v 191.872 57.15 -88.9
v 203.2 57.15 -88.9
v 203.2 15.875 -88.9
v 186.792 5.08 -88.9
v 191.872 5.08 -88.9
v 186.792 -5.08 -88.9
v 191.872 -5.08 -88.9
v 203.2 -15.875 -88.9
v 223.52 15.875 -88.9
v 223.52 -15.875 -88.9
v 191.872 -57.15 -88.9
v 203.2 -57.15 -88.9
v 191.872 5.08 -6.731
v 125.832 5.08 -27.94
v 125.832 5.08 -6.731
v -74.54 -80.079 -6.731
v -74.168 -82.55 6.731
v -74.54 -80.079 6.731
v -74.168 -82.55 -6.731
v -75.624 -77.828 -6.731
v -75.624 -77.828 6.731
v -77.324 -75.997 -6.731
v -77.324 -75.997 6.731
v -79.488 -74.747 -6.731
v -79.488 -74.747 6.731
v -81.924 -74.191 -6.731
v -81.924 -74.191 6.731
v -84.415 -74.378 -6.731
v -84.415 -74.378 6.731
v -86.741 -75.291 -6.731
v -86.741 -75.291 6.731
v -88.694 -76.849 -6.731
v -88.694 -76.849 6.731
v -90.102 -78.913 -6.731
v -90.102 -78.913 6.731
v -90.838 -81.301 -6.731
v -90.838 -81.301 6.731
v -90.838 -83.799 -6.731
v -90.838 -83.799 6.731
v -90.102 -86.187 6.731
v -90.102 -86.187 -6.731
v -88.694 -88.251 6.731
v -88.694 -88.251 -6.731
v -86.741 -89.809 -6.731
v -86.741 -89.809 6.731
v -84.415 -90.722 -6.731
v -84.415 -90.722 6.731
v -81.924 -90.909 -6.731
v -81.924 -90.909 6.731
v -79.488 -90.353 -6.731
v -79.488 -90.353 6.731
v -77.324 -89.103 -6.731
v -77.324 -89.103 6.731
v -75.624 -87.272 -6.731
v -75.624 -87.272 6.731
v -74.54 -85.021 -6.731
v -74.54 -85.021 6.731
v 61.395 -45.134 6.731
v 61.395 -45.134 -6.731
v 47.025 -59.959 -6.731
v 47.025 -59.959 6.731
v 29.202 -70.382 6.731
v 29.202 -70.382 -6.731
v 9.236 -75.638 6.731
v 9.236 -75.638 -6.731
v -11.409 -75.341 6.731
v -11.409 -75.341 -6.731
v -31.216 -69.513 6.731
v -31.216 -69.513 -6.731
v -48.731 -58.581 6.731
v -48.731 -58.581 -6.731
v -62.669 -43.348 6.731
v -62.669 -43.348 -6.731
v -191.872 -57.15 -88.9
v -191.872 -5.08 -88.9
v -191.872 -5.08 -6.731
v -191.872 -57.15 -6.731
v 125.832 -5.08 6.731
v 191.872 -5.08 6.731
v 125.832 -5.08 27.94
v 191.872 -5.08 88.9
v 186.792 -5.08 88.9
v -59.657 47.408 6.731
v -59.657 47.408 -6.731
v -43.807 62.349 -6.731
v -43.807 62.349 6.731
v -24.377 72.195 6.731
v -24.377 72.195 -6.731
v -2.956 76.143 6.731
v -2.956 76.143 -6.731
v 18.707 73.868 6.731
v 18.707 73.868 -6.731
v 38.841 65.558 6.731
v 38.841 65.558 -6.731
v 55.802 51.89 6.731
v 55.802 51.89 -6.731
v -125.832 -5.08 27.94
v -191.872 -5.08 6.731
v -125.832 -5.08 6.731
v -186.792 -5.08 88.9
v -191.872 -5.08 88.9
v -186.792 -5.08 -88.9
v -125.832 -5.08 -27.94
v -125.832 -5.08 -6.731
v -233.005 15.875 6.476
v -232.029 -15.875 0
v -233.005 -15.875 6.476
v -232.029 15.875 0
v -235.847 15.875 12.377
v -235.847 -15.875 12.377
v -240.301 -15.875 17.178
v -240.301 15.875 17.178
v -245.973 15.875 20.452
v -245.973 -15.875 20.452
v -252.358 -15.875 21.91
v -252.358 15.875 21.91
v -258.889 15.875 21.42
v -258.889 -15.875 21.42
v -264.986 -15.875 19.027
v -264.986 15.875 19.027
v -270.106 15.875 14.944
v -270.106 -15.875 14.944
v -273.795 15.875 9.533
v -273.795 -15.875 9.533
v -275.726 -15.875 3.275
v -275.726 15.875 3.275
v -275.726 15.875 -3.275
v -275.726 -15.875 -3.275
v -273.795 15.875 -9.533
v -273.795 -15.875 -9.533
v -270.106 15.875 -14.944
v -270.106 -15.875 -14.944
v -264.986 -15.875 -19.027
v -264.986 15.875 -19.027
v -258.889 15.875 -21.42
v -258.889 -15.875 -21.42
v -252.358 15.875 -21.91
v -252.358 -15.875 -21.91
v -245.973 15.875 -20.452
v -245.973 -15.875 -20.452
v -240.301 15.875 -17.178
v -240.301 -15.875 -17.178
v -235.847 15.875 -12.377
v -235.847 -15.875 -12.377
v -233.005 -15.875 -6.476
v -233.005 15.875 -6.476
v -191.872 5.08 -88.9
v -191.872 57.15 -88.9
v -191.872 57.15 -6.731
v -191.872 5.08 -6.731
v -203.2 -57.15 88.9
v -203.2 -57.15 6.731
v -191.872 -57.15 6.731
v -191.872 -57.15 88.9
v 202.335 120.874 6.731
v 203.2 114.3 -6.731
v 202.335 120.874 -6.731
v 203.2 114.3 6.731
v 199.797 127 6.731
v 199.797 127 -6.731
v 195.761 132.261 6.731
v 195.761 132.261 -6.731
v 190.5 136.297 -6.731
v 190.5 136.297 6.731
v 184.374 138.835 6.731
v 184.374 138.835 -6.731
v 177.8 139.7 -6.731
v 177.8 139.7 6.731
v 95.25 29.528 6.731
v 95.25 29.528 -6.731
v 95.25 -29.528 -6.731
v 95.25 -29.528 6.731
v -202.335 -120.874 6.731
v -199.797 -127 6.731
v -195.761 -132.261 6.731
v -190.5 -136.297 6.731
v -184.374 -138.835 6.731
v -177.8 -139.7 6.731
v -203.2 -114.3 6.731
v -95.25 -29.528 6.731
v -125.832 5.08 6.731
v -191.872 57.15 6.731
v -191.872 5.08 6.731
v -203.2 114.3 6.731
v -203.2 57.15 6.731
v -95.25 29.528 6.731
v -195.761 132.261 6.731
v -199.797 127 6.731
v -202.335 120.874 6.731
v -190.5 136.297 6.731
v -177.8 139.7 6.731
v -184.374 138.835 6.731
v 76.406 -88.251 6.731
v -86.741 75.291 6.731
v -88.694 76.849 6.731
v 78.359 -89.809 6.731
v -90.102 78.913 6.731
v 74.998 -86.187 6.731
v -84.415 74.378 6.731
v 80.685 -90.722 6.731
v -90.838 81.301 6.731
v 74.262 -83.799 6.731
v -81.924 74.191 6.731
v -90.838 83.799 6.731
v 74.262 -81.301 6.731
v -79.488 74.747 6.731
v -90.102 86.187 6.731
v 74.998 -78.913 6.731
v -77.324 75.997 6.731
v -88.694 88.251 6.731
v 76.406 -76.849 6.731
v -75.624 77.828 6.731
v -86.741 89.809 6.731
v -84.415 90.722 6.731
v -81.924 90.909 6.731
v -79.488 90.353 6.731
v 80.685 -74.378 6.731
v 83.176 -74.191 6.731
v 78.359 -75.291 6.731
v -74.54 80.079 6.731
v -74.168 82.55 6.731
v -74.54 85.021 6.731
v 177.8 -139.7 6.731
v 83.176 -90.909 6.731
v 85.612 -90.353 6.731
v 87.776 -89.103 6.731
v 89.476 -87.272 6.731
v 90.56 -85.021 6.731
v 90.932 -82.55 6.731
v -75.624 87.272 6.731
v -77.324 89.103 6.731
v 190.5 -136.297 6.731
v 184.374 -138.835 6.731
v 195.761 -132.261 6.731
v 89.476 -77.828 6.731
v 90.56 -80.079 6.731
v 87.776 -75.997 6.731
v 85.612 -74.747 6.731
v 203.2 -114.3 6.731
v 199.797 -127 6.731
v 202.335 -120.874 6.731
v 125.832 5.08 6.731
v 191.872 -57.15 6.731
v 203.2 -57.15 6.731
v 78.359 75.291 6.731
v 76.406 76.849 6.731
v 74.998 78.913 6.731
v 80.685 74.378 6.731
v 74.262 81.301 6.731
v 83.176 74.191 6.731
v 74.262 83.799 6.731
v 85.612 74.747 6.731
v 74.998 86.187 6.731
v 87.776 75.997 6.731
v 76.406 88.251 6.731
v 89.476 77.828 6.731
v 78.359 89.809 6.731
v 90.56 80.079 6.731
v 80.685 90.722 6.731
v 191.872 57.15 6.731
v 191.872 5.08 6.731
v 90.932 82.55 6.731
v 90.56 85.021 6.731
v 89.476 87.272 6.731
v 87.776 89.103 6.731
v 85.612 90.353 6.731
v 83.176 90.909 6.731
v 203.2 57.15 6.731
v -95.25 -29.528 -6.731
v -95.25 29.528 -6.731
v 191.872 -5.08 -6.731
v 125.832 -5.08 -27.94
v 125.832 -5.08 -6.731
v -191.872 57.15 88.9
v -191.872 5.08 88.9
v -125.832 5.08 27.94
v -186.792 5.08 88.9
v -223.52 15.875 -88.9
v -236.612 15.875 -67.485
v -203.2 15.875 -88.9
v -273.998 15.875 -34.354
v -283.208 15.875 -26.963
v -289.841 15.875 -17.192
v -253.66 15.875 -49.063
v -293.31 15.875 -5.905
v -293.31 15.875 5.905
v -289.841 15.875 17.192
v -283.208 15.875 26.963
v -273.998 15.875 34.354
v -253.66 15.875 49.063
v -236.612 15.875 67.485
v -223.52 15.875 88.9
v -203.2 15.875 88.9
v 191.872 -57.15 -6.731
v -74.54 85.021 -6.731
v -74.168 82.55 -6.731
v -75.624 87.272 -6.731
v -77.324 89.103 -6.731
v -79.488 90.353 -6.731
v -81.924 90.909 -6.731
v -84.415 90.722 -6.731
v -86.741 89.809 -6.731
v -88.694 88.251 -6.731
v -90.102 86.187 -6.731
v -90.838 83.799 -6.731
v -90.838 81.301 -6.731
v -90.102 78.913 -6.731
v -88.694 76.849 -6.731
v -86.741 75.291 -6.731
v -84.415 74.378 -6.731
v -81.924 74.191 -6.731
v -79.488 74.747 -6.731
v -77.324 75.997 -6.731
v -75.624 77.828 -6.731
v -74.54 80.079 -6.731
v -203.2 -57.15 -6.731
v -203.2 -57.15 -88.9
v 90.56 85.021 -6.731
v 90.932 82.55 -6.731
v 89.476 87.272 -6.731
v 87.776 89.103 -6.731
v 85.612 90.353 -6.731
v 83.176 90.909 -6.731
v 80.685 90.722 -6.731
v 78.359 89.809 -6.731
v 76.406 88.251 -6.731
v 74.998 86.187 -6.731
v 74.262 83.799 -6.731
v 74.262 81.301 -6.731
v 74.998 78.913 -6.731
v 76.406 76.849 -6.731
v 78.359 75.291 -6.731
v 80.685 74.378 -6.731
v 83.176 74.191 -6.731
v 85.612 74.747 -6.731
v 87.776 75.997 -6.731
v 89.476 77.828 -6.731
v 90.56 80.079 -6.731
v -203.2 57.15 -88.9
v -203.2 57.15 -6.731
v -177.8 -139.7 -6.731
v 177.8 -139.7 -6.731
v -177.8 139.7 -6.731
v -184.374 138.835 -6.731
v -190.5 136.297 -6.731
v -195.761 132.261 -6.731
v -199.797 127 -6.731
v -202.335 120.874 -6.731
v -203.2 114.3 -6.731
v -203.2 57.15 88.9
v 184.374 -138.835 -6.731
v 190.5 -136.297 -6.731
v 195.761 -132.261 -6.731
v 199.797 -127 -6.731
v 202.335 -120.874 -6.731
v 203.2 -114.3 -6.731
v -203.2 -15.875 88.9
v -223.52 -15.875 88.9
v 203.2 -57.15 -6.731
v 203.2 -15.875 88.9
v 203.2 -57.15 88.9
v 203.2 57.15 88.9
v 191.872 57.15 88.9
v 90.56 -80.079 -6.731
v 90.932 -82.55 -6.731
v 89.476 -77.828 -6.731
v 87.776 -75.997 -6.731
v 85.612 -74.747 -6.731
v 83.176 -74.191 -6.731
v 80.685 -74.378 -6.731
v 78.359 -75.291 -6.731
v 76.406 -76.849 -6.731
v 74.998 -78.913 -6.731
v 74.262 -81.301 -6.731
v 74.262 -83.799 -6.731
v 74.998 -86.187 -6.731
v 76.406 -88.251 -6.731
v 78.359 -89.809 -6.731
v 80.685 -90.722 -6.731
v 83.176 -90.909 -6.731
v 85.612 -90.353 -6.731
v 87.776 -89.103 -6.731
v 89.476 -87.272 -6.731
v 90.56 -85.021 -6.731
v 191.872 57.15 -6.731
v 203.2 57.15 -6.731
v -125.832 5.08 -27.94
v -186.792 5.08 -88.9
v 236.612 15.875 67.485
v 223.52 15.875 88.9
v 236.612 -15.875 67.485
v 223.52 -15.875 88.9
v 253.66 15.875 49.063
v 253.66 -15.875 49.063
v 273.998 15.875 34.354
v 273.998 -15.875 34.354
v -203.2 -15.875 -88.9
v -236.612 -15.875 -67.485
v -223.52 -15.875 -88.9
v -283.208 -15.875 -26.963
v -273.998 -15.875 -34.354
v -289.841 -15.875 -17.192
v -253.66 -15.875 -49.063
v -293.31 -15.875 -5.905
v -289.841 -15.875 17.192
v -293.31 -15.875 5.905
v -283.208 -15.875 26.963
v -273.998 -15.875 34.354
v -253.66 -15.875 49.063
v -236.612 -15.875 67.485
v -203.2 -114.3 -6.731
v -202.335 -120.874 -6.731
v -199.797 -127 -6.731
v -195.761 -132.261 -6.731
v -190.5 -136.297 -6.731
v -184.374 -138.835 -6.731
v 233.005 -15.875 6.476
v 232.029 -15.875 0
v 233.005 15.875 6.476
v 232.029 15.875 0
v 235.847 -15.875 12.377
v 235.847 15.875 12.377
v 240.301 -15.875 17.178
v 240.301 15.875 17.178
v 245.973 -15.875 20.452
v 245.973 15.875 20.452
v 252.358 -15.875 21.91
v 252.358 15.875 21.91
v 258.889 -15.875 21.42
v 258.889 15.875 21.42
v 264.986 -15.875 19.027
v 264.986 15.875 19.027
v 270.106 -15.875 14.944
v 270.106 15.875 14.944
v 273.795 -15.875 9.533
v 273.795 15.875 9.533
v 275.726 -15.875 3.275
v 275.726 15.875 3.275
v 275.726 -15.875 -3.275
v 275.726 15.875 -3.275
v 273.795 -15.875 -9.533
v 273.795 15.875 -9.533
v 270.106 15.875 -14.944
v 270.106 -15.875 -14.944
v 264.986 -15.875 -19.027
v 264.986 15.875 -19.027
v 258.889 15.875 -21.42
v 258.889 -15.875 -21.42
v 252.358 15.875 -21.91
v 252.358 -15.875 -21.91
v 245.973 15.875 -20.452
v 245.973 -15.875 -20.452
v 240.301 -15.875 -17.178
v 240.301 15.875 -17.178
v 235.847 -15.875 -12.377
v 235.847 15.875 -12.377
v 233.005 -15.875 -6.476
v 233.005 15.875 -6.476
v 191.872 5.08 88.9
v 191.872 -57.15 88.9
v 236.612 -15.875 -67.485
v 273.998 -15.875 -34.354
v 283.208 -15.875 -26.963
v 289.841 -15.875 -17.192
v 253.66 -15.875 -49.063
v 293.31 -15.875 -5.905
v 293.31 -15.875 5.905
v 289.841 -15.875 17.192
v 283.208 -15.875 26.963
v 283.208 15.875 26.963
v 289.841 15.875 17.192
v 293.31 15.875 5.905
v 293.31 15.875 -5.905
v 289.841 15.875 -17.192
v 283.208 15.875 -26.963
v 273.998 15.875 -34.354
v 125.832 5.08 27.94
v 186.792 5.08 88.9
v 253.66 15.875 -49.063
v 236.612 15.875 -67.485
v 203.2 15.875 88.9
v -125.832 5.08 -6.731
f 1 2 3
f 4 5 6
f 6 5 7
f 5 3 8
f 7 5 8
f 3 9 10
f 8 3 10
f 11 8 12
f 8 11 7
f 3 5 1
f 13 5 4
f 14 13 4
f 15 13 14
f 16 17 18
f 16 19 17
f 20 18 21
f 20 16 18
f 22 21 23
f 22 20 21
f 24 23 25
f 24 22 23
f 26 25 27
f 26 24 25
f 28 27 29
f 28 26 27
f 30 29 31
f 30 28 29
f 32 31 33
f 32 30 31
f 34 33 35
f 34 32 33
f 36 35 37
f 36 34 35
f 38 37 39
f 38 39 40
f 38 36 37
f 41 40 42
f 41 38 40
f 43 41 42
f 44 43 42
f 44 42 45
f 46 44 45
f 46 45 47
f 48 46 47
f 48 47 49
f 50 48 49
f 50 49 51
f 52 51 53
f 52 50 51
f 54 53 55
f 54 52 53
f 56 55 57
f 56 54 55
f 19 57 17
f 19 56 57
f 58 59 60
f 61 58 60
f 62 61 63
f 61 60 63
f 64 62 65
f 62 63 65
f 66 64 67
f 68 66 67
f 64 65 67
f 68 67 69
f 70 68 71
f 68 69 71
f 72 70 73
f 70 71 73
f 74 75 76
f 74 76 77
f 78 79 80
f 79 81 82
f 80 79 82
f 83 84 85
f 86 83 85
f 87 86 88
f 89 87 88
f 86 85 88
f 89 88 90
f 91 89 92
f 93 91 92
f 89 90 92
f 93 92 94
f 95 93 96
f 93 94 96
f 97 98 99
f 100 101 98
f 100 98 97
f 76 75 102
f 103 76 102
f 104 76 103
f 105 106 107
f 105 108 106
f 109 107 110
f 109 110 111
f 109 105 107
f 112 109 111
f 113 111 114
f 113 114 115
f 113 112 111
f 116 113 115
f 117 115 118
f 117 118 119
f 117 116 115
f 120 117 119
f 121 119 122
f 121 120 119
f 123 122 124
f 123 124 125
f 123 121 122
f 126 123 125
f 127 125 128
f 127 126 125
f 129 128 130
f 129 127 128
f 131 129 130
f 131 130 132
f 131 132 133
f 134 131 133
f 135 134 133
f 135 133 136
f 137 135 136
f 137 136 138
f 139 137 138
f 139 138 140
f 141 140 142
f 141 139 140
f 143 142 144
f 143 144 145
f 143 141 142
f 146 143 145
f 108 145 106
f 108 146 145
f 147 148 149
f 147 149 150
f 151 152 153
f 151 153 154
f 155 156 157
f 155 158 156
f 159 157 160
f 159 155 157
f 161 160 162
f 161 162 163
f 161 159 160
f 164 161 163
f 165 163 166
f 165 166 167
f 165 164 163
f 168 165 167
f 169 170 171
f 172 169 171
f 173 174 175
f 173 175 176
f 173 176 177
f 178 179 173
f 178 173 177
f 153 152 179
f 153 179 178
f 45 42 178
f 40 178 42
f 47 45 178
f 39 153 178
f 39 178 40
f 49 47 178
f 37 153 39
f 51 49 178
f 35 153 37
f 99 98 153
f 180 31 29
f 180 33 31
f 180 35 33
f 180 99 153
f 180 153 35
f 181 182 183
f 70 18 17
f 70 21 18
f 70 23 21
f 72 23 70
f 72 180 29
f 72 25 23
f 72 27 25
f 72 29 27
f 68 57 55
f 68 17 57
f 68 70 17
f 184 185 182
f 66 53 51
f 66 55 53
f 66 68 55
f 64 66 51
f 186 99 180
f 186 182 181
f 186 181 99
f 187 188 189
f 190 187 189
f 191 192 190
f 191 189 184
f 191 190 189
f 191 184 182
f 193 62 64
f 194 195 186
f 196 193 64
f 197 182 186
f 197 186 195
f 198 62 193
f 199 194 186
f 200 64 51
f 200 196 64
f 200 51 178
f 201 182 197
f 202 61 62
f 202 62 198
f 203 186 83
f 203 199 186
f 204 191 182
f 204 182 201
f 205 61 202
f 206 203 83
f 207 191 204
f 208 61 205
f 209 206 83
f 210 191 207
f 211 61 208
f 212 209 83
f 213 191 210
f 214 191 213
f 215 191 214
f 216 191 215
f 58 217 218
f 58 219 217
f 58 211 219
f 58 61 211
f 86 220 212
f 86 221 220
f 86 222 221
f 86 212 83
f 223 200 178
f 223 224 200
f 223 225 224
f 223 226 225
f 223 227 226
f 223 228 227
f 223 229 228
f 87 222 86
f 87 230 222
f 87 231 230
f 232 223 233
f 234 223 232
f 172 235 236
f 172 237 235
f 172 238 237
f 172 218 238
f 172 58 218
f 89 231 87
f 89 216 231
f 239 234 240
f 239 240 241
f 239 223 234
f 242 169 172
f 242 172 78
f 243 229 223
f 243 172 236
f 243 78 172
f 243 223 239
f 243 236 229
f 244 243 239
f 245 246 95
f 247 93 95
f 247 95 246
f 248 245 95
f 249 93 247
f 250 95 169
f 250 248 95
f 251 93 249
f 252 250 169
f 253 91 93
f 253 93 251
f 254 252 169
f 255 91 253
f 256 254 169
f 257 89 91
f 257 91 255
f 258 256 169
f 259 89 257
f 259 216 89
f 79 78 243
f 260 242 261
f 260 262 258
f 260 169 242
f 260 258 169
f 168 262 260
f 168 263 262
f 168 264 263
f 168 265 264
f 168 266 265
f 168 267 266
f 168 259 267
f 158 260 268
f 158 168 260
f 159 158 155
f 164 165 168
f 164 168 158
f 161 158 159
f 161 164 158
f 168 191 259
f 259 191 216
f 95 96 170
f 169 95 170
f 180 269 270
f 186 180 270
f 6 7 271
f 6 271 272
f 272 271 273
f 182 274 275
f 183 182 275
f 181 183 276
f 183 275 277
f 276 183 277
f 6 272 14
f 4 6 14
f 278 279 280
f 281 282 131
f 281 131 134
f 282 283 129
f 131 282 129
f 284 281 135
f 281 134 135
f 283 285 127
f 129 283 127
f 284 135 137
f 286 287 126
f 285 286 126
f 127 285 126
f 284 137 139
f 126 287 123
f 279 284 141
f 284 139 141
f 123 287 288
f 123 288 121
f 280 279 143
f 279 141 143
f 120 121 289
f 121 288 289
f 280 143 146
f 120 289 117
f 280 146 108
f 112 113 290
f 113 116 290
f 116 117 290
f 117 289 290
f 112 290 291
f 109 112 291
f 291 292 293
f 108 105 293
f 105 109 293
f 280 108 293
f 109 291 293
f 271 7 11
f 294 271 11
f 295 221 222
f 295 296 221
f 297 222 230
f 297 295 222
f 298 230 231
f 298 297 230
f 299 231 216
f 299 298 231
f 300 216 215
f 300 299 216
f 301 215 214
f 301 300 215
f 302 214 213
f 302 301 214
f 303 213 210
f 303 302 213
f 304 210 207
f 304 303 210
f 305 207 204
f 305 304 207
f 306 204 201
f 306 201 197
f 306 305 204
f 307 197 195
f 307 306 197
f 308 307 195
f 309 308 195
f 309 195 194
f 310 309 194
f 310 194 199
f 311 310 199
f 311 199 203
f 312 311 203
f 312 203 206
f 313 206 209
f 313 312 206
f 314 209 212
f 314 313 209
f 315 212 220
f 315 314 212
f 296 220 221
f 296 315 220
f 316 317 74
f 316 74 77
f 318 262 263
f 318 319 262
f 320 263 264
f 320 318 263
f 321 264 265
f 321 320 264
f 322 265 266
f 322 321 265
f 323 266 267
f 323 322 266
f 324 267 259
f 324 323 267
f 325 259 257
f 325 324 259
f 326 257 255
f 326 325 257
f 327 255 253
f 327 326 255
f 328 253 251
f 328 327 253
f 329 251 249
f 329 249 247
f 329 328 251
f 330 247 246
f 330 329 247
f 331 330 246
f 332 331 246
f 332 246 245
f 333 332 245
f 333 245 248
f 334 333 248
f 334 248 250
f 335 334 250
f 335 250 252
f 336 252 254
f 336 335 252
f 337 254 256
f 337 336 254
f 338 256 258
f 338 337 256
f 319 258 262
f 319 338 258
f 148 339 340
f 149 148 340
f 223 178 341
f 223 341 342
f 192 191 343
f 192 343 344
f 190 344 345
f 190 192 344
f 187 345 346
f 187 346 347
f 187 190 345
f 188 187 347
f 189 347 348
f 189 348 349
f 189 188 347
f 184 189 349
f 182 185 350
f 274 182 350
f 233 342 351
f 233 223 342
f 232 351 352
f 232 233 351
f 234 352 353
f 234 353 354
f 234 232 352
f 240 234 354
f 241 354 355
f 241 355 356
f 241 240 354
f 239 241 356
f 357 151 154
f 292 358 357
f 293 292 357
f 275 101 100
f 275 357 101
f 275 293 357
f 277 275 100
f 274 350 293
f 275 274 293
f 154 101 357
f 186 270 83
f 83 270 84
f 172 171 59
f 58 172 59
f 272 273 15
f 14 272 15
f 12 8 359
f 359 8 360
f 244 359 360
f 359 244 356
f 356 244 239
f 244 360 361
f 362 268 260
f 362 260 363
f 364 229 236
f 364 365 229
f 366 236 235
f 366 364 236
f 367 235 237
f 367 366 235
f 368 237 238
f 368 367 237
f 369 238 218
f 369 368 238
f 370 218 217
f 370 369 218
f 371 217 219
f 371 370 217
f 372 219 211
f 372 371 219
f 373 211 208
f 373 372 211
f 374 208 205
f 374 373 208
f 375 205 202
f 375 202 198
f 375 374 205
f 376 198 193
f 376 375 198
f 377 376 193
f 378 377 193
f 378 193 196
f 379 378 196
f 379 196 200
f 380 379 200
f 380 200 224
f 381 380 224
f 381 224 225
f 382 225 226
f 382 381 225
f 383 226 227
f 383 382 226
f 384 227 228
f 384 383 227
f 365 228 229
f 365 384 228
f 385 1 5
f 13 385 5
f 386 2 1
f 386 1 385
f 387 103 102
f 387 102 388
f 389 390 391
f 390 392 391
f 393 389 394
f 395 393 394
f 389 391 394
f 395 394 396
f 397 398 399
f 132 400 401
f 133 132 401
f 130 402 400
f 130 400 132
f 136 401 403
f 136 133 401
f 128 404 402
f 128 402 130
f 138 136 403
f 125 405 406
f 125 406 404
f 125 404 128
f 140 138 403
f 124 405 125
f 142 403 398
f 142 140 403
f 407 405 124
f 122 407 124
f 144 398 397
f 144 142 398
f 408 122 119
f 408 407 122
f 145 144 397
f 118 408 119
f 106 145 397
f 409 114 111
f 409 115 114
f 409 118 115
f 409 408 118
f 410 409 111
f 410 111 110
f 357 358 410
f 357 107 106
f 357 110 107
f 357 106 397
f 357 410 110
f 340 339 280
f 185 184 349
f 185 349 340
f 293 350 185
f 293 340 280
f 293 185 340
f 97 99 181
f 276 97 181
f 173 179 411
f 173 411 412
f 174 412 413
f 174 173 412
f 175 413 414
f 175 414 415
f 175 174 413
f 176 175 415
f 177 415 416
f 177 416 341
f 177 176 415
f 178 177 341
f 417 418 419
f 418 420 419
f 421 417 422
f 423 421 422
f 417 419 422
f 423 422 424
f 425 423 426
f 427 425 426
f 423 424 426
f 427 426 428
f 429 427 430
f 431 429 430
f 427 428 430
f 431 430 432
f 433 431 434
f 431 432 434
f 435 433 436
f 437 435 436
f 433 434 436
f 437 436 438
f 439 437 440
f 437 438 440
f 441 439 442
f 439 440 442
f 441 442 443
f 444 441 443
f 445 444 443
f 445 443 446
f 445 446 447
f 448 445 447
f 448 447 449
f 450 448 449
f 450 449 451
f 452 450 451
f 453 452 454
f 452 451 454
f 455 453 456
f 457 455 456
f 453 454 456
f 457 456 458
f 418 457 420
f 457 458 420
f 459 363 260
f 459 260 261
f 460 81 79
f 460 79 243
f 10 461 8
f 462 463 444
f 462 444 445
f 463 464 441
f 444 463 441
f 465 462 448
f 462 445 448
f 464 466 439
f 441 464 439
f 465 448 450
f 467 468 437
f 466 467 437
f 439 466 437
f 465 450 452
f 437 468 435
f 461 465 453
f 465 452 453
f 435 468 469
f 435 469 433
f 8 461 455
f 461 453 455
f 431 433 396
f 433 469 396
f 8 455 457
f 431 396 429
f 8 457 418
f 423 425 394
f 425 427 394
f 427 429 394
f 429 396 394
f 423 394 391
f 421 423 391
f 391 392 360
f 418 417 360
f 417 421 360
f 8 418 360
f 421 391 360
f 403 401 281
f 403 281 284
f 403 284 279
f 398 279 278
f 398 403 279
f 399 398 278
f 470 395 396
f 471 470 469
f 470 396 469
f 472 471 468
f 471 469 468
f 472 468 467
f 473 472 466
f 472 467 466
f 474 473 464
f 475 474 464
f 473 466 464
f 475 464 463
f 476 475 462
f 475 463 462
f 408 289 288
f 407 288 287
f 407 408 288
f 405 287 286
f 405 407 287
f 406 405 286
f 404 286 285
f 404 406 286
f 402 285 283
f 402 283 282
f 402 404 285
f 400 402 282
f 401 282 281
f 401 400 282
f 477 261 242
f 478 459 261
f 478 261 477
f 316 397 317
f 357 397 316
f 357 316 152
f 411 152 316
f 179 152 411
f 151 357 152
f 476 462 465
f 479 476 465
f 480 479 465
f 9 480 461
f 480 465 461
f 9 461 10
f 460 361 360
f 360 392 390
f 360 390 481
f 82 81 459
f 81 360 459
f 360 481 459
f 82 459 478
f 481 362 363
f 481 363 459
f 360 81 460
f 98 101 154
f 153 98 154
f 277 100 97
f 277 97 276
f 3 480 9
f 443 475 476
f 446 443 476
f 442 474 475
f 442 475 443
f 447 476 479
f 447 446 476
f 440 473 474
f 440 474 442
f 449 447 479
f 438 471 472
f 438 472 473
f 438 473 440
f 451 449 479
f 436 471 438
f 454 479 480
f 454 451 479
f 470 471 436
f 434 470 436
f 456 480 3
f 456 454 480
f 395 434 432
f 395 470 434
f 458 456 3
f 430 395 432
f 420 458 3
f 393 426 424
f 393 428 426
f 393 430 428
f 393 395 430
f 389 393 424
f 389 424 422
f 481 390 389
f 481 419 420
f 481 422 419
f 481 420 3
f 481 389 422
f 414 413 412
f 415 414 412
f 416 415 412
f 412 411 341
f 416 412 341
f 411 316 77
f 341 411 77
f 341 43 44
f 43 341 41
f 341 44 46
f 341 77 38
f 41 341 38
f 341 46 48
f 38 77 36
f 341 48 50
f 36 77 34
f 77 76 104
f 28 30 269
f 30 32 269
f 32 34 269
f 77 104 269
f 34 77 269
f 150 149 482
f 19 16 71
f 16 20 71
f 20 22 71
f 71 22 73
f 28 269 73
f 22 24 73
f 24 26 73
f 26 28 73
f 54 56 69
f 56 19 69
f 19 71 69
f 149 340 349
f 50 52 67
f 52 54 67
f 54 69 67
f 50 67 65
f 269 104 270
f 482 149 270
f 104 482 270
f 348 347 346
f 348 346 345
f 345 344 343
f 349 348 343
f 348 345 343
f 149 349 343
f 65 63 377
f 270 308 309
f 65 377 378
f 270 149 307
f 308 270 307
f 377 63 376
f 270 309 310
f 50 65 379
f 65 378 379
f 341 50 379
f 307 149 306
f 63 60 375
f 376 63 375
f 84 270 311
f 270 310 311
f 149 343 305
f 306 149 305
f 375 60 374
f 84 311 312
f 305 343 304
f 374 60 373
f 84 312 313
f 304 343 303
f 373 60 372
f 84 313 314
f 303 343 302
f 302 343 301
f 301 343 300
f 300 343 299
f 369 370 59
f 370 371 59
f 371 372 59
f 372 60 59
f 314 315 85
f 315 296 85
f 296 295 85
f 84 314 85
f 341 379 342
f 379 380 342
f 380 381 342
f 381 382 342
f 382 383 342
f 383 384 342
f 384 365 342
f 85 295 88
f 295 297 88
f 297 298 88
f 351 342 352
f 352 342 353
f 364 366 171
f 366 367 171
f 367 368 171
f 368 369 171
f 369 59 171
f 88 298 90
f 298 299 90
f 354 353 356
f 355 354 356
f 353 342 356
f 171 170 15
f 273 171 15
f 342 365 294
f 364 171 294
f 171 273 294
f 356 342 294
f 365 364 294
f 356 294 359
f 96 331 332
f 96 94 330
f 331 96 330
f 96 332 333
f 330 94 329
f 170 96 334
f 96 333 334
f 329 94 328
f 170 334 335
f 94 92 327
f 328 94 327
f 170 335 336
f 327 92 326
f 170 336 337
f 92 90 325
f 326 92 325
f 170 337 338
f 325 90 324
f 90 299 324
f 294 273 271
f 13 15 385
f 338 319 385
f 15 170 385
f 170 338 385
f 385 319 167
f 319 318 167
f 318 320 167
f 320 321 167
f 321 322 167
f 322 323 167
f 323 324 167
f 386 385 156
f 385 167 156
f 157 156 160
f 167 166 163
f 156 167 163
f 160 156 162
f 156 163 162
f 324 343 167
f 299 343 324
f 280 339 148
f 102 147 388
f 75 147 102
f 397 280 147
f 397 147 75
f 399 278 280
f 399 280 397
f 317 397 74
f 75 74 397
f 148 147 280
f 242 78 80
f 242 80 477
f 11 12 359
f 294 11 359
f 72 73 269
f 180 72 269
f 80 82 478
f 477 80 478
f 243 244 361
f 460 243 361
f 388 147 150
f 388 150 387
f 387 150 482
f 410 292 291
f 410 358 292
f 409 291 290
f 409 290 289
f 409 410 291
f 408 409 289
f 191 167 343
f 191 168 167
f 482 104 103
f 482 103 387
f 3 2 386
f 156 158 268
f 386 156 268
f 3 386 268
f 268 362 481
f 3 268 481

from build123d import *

# Parameters (mm, degrees)
F0_R      = 8.382
F1_DEPTH  = 6.731
F2_W      = 114.3
F2_H      = 177.8
F3_DEPTH  = 11.3284
F4_R      = 21.971
F5_DEPTH  = 15.875
F6_W      = 66.04
F6_H      = 10.16
F7_DEPTH  = 177.8
F8_SIZE   = 60.96
F10_DEPTH = 95.632


# Not quite as in the source:
# - a pattern or mirror of a feature is missing from the dataset's text; its kind, count and spacing are read off the source's solid


with BuildPart() as f1:
    # F0 (on Top) → F1 (new body, symmetric)
    with BuildSketch(Plane.XY):
        with BuildLine():
            Line((177.8, 139.7), (-177.8, 139.7))
            ThreePointArc((-177.8, 139.7), (-195.7605122421, 132.2605122421), (-203.2, 114.3))
            Line((-203.2, 114.3), (-203.2, -114.3))
            ThreePointArc((-203.2, -114.3), (-195.7605122421, -132.2605122421), (-177.8, -139.7))
            Line((-177.8, -139.7), (177.8, -139.7))
            ThreePointArc((177.8, -139.7), (195.7605122421, -132.2605122421), (203.2, -114.3))
            Line((203.2, -114.3), (203.2, 114.3))
            ThreePointArc((203.2, 114.3), (195.7605122421, 132.2605122421), (177.8, 139.7))
        make_face()
        with Locations((-82.55, -82.55)):
            Circle(F0_R, mode=Mode.SUBTRACT)
        with Locations((82.55, -82.55)):
            Circle(F0_R, mode=Mode.SUBTRACT)
        with Locations((-82.55, 82.55)):
            Circle(F0_R, mode=Mode.SUBTRACT)
        with Locations((82.55, 82.55)):
            Circle(F0_R, mode=Mode.SUBTRACT)
    extrude(amount=F1_DEPTH, both=True)

    # F2 (on face) → F3 (join)
    with BuildSketch(Plane(origin=(-203.2, 0, 0), x_dir=(0, -1, 0), z_dir=(-1, 0, 0))):
        Rectangle(F2_W, F2_H)
    f3 = extrude(amount=-F3_DEPTH)

    # F3_copies: F3 across plane
    add(f3.mirror(Plane(origin=(0, 0, 0), x_dir=(0, 0, 1), z_dir=(1, 0, 0))))

    # F4 (on Front) → F5 (join, symmetric)
    with BuildSketch(Plane.XZ):
        with BuildLine():
            ThreePointArc((-223.52, 88.9), (-244.6799408534, 57.8520750061), (-273.9982965787, 34.354186571))
            ThreePointArc((-273.9982965787, 34.354186571), (-293.751, 0), (-273.9982965787, -34.354186571))
            ThreePointArc((-273.9982965787, -34.354186571), (-244.6799408534, -57.8520750061), (-223.52, -88.9))
            Line((-223.52, -88.9), (-203.2, -88.9))
            Line((-203.2, -88.9), (-203.2, -6.731))
            Line((-203.2, -6.731), (-203.2, 6.731))
            Line((-203.2, 6.731), (-203.2, 88.9))
            Line((-203.2, 88.9), (-223.52, 88.9))
        make_face()
        with Locations((-254, 0)):
            Circle(F4_R, mode=Mode.SUBTRACT)
    f5 = extrude(amount=F5_DEPTH, both=True)

    # F5_copies: F5 across plane
    add(f5.mirror(Plane(origin=(0, 0, 0), x_dir=(0, 0, 1), z_dir=(1, 0, 0))))

    # F6 (on face) → F7 (join, through all)
    with BuildSketch(Plane.XY.offset(88.9)):
        with Locations((-158.8516, 0)):
            Rectangle(F6_W, F6_H)
    f7 = extrude(amount=-F7_DEPTH)

    # F7_copies: F7 across plane
    add(f7.mirror(Plane(origin=(0, 0, 0), x_dir=(0, 0, 1), z_dir=(1, 0, 0))))

    # F8
    f8_edges = [f1.edges().sort_by_distance(p)[0] for p in [
        (-125.8316, 0, -88.9),
        (-125.8316, 0, 88.9),
        (125.8316, 0, -88.9),
        (125.8316, 0, 88.9),
    ]]
    chamfer(f8_edges, length=F8_SIZE)

    # F9 (on face) → F10 (cut, through all)
    with BuildSketch(Plane(origin=(0, 0, -6.731), x_dir=(1, 0, 0), z_dir=(0, 0, -1))):
        with BuildLine():
            Line((-95.25, -29.5275), (-59.6566653523, -47.4080402362))
            ThreePointArc((-59.6566653523, -47.4080402362), (-2.9560938308, -76.1426392323), (55.8015879509, -51.8904883592))
            Line((55.8015879509, -51.8904883592), (95.25, -29.5275))
            Line((95.25, -29.5275), (95.25, 29.5275))
            Line((95.25, 29.5275), (61.3953822556, 45.1336574818))
            ThreePointArc((61.3953822556, 45.1336574818), (-1.0966393905, 76.1921083974), (-62.6689060075, 43.3479898015))
            Line((-62.6689060075, 43.3479898015), (-95.25, 29.5275))
            Line((-95.25, 29.5275), (-95.25, -29.5275))
        make_face()
    extrude(amount=-F10_DEPTH, mode=Mode.SUBTRACT)


solid = f1.part
